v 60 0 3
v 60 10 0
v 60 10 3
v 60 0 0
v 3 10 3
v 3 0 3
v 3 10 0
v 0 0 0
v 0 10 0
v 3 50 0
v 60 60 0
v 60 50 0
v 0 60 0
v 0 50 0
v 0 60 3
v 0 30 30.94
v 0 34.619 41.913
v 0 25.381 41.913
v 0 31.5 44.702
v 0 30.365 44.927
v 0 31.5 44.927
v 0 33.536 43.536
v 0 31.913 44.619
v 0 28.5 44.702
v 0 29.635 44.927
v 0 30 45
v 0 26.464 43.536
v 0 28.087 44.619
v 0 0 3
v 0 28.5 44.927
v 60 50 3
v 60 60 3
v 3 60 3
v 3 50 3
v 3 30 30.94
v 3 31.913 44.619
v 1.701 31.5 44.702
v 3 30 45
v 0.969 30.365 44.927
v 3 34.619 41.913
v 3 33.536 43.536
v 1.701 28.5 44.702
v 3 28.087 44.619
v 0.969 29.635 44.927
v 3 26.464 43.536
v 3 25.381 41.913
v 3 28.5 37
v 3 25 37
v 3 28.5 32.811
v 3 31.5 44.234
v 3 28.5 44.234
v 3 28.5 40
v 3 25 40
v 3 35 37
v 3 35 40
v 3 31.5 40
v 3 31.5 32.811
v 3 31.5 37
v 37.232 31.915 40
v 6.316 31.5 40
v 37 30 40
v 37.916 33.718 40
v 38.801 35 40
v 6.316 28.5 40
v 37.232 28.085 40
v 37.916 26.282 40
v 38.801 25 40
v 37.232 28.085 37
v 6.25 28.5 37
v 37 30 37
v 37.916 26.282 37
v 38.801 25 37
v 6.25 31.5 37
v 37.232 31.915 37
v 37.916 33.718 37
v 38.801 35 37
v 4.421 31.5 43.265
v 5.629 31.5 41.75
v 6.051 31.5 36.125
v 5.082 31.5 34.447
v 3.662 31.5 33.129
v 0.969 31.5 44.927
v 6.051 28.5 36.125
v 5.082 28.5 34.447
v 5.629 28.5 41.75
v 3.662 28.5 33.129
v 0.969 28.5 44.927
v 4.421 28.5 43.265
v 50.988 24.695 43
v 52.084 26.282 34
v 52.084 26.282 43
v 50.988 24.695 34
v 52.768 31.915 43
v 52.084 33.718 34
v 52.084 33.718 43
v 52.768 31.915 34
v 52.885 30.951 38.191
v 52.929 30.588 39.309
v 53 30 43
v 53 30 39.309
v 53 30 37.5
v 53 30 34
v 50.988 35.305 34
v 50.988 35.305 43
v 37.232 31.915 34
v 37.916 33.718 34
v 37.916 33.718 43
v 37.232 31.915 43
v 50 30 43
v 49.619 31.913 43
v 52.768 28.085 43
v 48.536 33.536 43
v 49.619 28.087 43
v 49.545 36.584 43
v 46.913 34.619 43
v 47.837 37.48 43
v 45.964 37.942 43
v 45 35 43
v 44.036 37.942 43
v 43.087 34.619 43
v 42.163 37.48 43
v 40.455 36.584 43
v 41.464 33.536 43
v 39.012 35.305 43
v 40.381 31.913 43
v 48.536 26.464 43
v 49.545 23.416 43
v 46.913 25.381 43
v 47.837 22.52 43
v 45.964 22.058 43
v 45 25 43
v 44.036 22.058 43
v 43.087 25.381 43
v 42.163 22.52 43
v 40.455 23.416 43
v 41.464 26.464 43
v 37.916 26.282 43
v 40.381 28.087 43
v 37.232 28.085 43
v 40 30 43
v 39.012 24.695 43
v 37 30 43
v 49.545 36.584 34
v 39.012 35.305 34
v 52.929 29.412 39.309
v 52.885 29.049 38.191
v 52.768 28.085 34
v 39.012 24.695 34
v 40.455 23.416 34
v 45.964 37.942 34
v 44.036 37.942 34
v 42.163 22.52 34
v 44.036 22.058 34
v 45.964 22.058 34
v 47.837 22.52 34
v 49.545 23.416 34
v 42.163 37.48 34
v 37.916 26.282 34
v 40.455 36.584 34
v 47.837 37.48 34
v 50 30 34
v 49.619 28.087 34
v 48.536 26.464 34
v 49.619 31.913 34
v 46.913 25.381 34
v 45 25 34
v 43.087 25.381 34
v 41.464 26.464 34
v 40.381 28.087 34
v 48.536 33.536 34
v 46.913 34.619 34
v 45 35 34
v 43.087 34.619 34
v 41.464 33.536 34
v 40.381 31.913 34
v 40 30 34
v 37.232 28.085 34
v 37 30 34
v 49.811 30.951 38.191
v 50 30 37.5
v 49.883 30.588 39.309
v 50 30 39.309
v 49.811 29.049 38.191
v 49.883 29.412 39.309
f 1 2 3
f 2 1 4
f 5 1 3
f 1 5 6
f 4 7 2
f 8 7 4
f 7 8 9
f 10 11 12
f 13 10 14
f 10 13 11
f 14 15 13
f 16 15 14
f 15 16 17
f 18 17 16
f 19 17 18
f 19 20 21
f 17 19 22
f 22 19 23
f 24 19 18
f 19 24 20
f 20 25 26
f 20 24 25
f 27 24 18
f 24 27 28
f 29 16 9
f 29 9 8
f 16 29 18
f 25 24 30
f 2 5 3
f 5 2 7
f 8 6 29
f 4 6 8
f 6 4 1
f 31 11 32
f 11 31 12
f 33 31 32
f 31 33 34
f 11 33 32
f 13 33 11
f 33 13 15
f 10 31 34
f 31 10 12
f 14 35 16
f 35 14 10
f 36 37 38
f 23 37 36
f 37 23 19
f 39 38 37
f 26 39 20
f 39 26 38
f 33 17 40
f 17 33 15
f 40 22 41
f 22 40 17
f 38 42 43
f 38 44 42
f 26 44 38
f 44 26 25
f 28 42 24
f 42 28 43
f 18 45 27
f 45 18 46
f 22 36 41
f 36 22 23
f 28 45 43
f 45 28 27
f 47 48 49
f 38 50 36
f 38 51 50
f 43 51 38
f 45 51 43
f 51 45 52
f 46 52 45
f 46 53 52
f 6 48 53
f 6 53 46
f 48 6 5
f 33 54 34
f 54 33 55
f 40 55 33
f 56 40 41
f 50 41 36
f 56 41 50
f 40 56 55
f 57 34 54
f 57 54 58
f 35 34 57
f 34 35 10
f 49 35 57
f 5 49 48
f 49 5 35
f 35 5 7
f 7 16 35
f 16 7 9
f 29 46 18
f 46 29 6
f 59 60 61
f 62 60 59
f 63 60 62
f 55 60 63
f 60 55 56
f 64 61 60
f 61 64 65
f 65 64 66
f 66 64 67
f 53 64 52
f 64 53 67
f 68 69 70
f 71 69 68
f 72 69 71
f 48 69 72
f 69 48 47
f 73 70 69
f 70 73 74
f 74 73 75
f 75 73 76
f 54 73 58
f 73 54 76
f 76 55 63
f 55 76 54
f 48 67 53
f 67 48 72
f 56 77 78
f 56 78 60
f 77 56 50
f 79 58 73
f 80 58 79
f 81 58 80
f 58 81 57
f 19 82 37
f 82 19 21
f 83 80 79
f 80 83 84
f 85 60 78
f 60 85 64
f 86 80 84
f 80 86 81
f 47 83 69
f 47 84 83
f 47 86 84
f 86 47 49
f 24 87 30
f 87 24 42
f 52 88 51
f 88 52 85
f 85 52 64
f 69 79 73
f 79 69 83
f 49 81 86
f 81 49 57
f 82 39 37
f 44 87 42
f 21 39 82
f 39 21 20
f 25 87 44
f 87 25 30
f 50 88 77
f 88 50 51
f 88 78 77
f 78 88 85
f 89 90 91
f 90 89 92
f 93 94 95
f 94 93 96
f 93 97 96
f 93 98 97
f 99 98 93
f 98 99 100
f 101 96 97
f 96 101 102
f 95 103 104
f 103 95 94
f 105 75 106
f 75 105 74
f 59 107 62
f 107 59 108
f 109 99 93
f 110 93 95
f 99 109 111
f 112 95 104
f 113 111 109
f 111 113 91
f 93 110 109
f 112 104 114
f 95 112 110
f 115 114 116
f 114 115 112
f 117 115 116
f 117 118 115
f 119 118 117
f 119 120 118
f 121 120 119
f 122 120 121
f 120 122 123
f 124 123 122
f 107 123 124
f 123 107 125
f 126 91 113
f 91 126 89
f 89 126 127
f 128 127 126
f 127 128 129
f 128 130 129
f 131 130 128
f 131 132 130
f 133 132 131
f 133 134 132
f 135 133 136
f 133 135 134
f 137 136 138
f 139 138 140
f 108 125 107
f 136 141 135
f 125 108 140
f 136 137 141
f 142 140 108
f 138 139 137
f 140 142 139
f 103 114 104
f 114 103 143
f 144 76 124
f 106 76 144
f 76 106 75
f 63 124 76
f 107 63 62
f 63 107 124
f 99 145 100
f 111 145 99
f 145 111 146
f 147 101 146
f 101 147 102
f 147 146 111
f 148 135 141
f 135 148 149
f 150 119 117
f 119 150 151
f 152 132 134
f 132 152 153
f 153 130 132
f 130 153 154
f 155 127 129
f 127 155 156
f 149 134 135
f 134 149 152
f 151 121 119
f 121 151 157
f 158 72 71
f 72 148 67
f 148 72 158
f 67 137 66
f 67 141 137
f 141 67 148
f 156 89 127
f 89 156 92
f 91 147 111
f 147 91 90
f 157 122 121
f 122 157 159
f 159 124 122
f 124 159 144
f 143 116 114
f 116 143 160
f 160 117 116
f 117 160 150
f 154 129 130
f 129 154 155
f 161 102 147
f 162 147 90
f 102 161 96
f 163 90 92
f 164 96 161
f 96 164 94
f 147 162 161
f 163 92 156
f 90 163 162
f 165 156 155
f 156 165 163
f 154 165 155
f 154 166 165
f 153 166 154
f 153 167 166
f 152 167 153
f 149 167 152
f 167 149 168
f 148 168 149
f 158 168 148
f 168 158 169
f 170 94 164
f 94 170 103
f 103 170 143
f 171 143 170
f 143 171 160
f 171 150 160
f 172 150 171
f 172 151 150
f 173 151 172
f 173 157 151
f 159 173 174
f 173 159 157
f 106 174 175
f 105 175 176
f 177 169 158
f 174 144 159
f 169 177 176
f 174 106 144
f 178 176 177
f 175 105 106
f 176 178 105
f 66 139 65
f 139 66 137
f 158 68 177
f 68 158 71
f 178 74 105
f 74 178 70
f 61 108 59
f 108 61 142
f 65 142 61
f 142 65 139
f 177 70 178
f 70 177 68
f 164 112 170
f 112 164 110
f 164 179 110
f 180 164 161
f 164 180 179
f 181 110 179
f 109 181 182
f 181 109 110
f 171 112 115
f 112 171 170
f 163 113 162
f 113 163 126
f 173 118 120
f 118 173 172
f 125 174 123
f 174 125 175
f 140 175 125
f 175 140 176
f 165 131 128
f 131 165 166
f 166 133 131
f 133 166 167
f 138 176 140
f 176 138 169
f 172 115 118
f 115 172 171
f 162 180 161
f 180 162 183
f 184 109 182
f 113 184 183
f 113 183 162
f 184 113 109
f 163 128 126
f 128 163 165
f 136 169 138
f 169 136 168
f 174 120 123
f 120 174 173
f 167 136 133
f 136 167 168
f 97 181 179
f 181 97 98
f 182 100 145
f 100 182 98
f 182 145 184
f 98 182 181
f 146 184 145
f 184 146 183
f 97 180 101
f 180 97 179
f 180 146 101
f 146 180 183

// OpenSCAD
extremes=80;
LegLength=60;
LegWidth=10;
Thickness=3;
LegSpacing=40;
strutwidth=5;
height=40;
probeRadius=5;
screwRadius=1;

intersection(){
	cube(extremes);
	difference(){
		union(){
			cube([LegLength,LegWidth,Thickness]);
			translate([0,LegSpacing+LegWidth,0])cube([LegLength,LegWidth,Thickness]);
			hull(){
				translate([0,LegSpacing+LegWidth,0])cube([Thickness,LegWidth,Thickness]);
				translate([0,(LegSpacing+LegWidth)/2+strutwidth,height])rotate([0,90,0])cylinder(r=strutwidth,h=Thickness);
			}
			hull(){
				translate([0,0,0])cube([Thickness,LegWidth,Thickness]);
				translate([0,(LegSpacing+LegWidth)/2+strutwidth,height])rotate([0,90,0])cylinder(r=strutwidth,h=Thickness);
			}
			translate([0,(LegSpacing+LegWidth)/2,height-Thickness])cube([LegLength*.75,LegWidth,Thickness]);
			translate([0,(LegSpacing+LegWidth)/2+strutwidth-Thickness/2,height-Thickness/2])rotate([0,90,90])cylinder(r=strutwidth+Thickness/2,h=Thickness);
			translate([LegLength*.75,(LegSpacing+LegWidth)/2+probeRadius,height-2*Thickness])cylinder(r=probeRadius+Thickness,h=3*Thickness);
		}
		translate([LegLength*.75,(LegSpacing+LegWidth)/2+probeRadius,height-2*Thickness])cylinder(r=probeRadius,h=7*Thickness);
		translate([LegLength*.75+probeRadius-Thickness,(LegSpacing+LegWidth)/2+probeRadius,height-.5*Thickness])rotate([0,90,0])cylinder(r=screwRadius,h=7*Thickness);
	}
}
